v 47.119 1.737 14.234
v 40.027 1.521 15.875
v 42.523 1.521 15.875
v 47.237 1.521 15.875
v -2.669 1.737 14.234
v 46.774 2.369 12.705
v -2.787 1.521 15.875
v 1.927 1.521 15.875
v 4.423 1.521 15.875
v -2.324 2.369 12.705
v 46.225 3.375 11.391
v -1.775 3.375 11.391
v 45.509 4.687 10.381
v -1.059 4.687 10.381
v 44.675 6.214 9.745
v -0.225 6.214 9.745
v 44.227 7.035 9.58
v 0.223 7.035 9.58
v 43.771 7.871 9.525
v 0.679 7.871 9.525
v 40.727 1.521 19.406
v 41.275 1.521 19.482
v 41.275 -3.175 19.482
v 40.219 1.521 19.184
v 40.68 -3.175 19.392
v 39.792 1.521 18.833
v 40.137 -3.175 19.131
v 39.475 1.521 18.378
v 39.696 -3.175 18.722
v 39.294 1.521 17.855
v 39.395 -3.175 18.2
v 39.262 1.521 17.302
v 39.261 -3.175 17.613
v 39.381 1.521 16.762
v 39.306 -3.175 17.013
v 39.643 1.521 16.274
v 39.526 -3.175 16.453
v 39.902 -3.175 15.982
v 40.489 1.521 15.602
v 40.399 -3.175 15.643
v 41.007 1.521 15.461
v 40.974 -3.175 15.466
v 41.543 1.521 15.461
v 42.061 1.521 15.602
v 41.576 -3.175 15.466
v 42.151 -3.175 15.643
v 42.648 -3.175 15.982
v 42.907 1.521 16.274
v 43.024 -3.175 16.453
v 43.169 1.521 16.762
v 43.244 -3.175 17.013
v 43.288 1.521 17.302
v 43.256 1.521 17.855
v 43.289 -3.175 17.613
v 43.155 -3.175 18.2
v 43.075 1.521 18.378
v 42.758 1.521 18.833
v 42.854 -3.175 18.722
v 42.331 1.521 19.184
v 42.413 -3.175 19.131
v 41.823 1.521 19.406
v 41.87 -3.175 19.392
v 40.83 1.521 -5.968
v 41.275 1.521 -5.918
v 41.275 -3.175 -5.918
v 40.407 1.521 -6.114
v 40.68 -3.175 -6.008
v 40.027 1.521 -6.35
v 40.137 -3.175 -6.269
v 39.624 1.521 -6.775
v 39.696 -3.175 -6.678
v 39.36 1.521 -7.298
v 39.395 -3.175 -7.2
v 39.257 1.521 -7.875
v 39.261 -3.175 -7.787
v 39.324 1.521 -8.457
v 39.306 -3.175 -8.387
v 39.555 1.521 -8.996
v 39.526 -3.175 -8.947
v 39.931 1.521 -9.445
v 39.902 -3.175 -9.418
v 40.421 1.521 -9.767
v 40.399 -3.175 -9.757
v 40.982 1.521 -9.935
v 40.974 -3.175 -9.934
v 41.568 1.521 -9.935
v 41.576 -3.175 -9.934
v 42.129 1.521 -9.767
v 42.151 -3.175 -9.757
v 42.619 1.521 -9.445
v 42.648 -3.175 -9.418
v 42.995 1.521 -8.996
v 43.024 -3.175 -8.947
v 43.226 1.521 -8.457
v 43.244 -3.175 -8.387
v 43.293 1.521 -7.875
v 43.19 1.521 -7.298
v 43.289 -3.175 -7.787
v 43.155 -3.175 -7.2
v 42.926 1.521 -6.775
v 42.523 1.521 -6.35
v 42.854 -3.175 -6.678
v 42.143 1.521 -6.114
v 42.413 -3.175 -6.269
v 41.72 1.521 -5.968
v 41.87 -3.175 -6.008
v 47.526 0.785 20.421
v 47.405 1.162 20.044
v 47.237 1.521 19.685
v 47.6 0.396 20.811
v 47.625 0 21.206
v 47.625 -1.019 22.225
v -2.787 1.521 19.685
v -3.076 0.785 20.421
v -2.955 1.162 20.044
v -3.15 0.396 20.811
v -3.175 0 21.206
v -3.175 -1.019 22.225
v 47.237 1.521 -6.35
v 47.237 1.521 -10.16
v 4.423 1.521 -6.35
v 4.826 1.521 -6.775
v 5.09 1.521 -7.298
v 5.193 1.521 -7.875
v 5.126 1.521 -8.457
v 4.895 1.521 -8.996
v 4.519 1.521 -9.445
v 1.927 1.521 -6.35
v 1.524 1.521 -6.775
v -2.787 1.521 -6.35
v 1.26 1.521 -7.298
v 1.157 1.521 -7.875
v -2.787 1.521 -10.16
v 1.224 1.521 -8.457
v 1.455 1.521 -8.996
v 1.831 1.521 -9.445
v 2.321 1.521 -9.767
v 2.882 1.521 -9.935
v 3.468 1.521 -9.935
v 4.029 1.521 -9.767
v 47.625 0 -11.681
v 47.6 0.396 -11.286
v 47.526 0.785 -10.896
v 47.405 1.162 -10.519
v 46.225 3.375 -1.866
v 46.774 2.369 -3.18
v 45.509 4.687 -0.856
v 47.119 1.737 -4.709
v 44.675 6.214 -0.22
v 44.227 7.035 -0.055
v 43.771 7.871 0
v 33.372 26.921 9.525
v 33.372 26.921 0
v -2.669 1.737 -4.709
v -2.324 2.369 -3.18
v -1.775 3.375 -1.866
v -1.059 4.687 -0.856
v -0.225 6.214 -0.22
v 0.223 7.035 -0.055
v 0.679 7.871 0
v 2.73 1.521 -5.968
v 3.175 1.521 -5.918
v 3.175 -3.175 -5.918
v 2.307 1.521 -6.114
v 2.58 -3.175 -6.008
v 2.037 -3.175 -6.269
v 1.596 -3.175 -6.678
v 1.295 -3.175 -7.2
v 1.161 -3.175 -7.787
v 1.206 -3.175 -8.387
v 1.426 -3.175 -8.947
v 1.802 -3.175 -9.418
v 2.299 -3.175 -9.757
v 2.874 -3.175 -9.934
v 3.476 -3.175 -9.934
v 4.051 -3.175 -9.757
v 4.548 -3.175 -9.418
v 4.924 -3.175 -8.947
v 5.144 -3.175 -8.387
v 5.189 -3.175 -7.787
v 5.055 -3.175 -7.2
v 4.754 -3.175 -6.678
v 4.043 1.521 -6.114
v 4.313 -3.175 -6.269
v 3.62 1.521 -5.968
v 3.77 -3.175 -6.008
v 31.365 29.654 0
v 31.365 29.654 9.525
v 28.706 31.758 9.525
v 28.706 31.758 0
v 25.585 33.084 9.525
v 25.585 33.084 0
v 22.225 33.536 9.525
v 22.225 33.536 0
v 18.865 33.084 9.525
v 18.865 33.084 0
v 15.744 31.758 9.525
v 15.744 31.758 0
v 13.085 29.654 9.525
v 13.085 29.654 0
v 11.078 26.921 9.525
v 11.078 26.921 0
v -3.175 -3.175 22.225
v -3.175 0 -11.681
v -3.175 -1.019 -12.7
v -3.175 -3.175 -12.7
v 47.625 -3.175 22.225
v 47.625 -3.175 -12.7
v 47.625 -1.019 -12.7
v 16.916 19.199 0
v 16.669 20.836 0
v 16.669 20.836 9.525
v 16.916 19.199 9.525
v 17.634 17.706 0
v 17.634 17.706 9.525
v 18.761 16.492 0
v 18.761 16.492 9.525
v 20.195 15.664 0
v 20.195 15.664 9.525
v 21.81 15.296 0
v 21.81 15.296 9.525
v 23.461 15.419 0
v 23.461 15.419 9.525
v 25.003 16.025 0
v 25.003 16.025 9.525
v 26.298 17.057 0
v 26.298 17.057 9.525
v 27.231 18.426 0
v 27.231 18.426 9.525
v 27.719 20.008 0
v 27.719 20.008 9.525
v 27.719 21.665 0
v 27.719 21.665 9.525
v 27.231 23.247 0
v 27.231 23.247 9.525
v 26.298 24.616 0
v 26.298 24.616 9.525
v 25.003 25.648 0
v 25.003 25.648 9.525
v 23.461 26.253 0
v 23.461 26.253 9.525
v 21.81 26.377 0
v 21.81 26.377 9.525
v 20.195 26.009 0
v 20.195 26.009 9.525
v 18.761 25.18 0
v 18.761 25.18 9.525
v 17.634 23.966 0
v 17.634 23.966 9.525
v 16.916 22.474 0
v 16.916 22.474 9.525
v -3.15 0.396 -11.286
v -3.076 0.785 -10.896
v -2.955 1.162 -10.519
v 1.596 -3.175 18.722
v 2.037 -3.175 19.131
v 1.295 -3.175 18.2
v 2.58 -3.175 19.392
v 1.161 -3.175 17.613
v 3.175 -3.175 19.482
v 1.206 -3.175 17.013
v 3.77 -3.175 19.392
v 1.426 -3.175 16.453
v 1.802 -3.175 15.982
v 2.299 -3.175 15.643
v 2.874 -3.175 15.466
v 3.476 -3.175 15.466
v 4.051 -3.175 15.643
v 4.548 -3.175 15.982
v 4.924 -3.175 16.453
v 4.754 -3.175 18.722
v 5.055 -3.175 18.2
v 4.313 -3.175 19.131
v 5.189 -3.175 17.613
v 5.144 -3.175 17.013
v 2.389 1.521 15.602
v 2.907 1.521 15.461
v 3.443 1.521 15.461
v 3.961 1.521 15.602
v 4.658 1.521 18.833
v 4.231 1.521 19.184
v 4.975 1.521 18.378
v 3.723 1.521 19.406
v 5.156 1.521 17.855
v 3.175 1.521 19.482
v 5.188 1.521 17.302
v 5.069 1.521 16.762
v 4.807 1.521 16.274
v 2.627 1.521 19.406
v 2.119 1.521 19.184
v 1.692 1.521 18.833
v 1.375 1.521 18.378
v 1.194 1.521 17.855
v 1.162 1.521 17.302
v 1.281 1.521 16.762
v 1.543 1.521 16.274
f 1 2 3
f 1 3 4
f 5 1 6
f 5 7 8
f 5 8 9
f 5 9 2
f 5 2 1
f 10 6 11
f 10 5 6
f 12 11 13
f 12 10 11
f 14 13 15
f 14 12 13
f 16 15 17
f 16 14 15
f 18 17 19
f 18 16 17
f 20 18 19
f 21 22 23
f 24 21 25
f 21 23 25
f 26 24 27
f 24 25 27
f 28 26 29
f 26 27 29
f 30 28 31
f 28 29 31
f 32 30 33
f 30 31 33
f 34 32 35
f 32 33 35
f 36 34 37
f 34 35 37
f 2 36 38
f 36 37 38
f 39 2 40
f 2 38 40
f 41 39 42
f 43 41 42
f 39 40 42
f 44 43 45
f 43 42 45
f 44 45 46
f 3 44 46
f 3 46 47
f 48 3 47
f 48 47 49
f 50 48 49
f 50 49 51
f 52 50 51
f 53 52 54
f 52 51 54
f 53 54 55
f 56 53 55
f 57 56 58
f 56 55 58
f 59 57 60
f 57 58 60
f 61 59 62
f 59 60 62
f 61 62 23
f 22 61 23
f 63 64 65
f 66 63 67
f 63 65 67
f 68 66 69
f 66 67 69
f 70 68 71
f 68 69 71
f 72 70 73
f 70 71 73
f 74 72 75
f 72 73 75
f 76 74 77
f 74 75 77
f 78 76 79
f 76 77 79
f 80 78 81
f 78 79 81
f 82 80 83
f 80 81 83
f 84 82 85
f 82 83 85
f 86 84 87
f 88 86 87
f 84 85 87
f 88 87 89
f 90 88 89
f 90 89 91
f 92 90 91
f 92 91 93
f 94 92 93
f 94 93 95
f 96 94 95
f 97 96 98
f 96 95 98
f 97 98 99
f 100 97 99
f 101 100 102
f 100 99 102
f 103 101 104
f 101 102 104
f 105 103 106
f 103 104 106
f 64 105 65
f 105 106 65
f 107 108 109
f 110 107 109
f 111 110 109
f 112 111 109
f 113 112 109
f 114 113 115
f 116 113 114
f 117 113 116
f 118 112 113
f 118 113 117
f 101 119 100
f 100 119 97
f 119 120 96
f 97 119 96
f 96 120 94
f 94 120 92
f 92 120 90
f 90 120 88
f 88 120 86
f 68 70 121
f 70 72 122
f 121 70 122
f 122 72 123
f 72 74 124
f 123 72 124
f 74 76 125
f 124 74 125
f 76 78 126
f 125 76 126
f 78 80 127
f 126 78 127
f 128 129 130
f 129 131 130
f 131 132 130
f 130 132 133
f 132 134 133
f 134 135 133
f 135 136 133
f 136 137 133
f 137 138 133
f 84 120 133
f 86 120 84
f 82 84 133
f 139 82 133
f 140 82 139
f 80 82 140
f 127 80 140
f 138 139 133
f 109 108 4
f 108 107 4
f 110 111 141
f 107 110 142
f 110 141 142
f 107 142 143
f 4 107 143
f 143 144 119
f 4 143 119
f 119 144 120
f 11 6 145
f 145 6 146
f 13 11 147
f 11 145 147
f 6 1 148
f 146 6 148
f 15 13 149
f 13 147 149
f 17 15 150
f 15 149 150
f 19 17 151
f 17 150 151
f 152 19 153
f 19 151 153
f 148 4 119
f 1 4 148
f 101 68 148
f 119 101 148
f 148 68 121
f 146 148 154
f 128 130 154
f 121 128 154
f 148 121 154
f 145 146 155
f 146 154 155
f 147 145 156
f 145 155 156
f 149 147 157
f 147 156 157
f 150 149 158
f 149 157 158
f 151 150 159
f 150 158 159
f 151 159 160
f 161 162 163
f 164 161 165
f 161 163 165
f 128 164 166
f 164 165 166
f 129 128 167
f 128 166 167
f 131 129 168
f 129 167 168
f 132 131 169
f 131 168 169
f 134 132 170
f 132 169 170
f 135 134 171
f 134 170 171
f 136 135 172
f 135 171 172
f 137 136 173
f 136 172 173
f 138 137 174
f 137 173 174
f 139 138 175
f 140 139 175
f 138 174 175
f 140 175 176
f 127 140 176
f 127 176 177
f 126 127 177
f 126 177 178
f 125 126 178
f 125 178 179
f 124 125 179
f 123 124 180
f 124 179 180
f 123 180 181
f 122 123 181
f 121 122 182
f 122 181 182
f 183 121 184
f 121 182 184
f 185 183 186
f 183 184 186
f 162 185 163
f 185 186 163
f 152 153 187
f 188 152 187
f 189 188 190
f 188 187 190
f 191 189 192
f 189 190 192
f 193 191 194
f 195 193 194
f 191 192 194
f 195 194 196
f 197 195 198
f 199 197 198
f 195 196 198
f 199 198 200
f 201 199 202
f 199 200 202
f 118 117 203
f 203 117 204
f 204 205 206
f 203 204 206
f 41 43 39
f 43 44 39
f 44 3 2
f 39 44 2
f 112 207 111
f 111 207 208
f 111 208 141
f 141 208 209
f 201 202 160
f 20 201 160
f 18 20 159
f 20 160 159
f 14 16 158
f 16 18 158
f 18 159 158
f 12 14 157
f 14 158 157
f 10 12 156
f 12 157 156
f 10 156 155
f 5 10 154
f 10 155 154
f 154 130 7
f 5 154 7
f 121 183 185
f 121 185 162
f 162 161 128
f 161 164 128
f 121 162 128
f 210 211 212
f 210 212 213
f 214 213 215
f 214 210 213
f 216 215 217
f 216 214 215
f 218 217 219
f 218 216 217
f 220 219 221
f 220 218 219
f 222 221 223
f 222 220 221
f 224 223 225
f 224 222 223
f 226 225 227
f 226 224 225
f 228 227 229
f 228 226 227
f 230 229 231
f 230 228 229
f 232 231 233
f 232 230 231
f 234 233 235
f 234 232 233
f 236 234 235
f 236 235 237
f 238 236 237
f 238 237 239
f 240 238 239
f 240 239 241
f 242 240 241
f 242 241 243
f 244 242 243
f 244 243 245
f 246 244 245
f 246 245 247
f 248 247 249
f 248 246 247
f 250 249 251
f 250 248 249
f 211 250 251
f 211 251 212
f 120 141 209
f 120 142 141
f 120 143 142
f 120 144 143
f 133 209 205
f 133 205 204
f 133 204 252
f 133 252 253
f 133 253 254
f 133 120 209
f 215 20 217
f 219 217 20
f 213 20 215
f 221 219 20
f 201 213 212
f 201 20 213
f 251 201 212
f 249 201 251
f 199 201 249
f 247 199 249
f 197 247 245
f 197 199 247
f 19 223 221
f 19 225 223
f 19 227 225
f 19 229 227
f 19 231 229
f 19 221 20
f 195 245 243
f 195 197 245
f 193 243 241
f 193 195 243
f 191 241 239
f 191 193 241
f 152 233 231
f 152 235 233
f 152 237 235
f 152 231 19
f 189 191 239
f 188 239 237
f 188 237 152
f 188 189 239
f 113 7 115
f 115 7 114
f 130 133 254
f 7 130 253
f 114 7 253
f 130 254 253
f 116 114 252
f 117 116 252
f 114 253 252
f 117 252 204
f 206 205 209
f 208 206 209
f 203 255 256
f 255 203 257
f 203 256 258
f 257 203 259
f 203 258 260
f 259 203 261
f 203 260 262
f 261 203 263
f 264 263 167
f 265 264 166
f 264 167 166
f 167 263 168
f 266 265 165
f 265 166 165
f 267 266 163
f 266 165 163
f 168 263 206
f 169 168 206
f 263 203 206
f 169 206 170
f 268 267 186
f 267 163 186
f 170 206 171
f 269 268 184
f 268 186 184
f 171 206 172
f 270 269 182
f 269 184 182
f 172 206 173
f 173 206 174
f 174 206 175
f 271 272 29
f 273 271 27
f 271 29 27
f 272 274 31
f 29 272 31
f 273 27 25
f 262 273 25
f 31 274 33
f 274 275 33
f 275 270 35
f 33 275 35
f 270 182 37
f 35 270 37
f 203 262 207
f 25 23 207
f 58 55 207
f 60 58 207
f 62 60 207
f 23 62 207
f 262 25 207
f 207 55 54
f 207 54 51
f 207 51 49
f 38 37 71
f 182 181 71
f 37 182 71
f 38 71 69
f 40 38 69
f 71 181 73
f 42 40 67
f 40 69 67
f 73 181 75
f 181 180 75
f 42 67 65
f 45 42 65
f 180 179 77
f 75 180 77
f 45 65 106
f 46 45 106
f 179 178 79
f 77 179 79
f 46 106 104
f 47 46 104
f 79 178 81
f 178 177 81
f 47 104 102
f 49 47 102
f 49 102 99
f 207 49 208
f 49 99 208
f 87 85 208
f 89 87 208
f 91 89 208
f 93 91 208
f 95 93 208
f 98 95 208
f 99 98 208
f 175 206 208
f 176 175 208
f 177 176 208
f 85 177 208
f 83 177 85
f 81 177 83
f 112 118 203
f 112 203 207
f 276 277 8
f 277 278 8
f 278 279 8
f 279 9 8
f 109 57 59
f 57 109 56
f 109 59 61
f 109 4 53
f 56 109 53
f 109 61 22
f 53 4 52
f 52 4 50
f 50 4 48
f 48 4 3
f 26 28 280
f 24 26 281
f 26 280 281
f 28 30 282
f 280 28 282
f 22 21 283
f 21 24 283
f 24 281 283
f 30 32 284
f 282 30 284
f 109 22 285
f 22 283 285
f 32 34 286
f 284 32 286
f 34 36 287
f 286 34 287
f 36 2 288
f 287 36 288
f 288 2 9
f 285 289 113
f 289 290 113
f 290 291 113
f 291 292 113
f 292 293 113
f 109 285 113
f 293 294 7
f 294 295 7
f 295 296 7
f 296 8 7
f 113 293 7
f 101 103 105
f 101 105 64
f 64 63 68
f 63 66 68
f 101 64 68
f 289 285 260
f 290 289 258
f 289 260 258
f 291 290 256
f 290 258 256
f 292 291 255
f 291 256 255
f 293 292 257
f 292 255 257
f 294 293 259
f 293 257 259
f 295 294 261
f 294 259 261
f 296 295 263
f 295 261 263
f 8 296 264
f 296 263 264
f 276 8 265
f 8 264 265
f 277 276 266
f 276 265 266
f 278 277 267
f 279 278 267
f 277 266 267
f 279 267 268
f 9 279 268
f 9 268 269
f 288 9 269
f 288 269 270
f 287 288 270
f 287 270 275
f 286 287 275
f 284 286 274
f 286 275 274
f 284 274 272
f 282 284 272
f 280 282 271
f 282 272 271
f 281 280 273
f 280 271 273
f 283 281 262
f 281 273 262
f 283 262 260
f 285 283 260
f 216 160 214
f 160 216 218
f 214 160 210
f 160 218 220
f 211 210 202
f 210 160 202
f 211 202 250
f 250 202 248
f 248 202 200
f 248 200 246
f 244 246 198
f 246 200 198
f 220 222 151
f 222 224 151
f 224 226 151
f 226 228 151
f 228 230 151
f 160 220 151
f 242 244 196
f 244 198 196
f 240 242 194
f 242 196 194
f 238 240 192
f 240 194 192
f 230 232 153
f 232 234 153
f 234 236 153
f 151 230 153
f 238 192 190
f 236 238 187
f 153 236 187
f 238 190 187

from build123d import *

# Parameters (mm, degrees)
SKETCH1_R                       = 5.55625
BOSS_EXTRUDE1_DEPTH             = 9.525
BOSS_EXTRUDE2_DEPTH             = 12.7
CHAMFER3_SIZE                   = 2.54
BOSS_EXTRUDE3_START             = 12.7
BOSS_EXTRUDE3_DEPTH             = 12.7
CHAMFER4_SIZE                   = 2.54
FILLET4_R                       = 6.35
SKETCH9_W                       = 2.0193
SKETCH9_H                       = 4.6961896
F_10_32_TAPPED_HOLE1_AT_2_COUNT = 2
F_10_32_TAPPED_HOLE1_AT_2_PITCH = 38.1
F_10_32_TAPPED_HOLE1_AT_3_COUNT = 2
F_10_32_TAPPED_HOLE1_AT_3_PITCH = 45.790501198
F_10_32_TAPPED_HOLE1_AT_4_COUNT = 2
F_10_32_TAPPED_HOLE1_AT_4_PITCH = 25.4


with BuildPart() as part:
    # Sketch1 → Boss-Extrude1 (new body)
    with BuildSketch(Plane.XY):
        with BuildLine():
            Line((0, -3.175), (44.45, -3.175))
            Line((44.45, -3.175), (47.625, -3.175))
            Line((47.625, -3.175), (47.625, 0))
            ThreePointArc((47.625, 0), (47.52643593, 0.784963037), (47.236863327, 1.5211896))
            Line((47.236863327, 1.5211896), (33.372453307, 26.9211896))
            ThreePointArc((33.372453307, 26.9211896), (22.225, 33.536431201), (11.077546693, 26.9211896))
            Line((11.077546693, 26.9211896), (-2.786863327, 1.5211896))
            ThreePointArc((-2.786863327, 1.5211896), (-3.07643593, 0.784963037), (-3.175, 0))
            Line((-3.175, 0), (-3.175, -3.175))
            Line((-3.175, -3.175), (0, -3.175))
        make_face()
        with Locations(Location((22.225, 20.836431201, 0), (0, 0, 180))):
            Circle(SKETCH1_R, mode=Mode.SUBTRACT)
    extrude(amount=BOSS_EXTRUDE1_DEPTH)

    # Sketch4 → Boss-Extrude2 (add)
    with BuildSketch(Plane.XY.offset(9.525)):
        with BuildLine():
            Line((47.625, -3.175), (47.625, 0))
            ThreePointArc((47.625, 0), (47.52643593, 0.784963037), (47.236863327, 1.5211896))
            Line((47.236863327, 1.5211896), (-2.786863327, 1.5211896))
            ThreePointArc((-2.786863327, 1.5211896), (-3.07643593, 0.784963037), (-3.175, 0))
            Line((-3.175, 0), (-3.175, -3.175))
            Line((-3.175, -3.175), (47.625, -3.175))
        make_face()
    extrude(amount=BOSS_EXTRUDE2_DEPTH)

    # Chamfer3
    chamfer3_edges = [part.edges().sort_by_distance(p)[0] for p in [
        (22.225, 1.5211896, 22.225),
    ]]
    chamfer(chamfer3_edges, length=CHAMFER3_SIZE)

    # Sketch6 → Boss-Extrude3 (add)
    with BuildSketch(Plane(origin=(0, 0, 0), x_dir=(-1, 0, 0), z_dir=(0, 0, -1)).offset(BOSS_EXTRUDE3_START)):
        with BuildLine():
            Line((3.175, 0), (3.175, -3.175))
            Line((3.175, -3.175), (-47.625, -3.175))
            Line((-47.625, -3.175), (-47.625, 0))
            ThreePointArc((-47.625, 0), (-47.52643593, 0.784963037), (-47.236863327, 1.5211896))
            Line((-47.236863327, 1.5211896), (2.786863327, 1.5211896))
            ThreePointArc((2.786863327, 1.5211896), (3.07643593, 0.784963037), (3.175, 0))
        make_face()
    extrude(amount=-BOSS_EXTRUDE3_DEPTH)

    # Chamfer4
    chamfer4_edges = [part.edges().sort_by_distance(p)[0] for p in [
        (22.225, 1.5211896, -12.7),
    ]]
    chamfer(chamfer4_edges, length=CHAMFER4_SIZE)

    # Fillet4
    fillet4_edges = [part.edges().sort_by_distance(p)[0] for p in [
        (22.225, 1.5211896, 9.525),
        (22.225, 1.5211896, 0),
    ]]
    fillet(fillet4_edges, radius=FILLET4_R)

    # Sketch9 → #10-32 Tapped Hole1 (revolve, cut)
    with BuildSketch(Plane(origin=(3.175, 1.5211896, -7.9375), x_dir=(0, 0, 1), z_dir=(1, 0, 0))):
        with Locations((1.00965, 2.3480948)):
            Rectangle(SKETCH9_W, SKETCH9_H)
    f_10_32_tapped_hole1 = revolve(axis=Axis((3.175, 7.8711896, -7.9375), (0, -1, 0)), mode=Mode.SUBTRACT)

    # #10-32 Tapped Hole1 at 2: #10-32 Tapped Hole1 ×2
    with Locations(*[(i * F_10_32_TAPPED_HOLE1_AT_2_PITCH, 0, 0) for i in range(1, F_10_32_TAPPED_HOLE1_AT_2_COUNT)]):
        add(f_10_32_tapped_hole1, mode=Mode.SUBTRACT)

    # #10-32 Tapped Hole1 at 3: #10-32 Tapped Hole1 ×2
    with Locations(*[Vector(0.8320502943378437, 0, 0.5547001962252291) * (i * F_10_32_TAPPED_HOLE1_AT_3_PITCH) for i in range(1, F_10_32_TAPPED_HOLE1_AT_3_COUNT)]):
        add(f_10_32_tapped_hole1, mode=Mode.SUBTRACT)

    # #10-32 Tapped Hole1 at 4: #10-32 Tapped Hole1 ×2
    with Locations(*[(0, 0, i * F_10_32_TAPPED_HOLE1_AT_4_PITCH) for i in range(1, F_10_32_TAPPED_HOLE1_AT_4_COUNT)]):
        add(f_10_32_tapped_hole1, mode=Mode.SUBTRACT)


solid = part.part
